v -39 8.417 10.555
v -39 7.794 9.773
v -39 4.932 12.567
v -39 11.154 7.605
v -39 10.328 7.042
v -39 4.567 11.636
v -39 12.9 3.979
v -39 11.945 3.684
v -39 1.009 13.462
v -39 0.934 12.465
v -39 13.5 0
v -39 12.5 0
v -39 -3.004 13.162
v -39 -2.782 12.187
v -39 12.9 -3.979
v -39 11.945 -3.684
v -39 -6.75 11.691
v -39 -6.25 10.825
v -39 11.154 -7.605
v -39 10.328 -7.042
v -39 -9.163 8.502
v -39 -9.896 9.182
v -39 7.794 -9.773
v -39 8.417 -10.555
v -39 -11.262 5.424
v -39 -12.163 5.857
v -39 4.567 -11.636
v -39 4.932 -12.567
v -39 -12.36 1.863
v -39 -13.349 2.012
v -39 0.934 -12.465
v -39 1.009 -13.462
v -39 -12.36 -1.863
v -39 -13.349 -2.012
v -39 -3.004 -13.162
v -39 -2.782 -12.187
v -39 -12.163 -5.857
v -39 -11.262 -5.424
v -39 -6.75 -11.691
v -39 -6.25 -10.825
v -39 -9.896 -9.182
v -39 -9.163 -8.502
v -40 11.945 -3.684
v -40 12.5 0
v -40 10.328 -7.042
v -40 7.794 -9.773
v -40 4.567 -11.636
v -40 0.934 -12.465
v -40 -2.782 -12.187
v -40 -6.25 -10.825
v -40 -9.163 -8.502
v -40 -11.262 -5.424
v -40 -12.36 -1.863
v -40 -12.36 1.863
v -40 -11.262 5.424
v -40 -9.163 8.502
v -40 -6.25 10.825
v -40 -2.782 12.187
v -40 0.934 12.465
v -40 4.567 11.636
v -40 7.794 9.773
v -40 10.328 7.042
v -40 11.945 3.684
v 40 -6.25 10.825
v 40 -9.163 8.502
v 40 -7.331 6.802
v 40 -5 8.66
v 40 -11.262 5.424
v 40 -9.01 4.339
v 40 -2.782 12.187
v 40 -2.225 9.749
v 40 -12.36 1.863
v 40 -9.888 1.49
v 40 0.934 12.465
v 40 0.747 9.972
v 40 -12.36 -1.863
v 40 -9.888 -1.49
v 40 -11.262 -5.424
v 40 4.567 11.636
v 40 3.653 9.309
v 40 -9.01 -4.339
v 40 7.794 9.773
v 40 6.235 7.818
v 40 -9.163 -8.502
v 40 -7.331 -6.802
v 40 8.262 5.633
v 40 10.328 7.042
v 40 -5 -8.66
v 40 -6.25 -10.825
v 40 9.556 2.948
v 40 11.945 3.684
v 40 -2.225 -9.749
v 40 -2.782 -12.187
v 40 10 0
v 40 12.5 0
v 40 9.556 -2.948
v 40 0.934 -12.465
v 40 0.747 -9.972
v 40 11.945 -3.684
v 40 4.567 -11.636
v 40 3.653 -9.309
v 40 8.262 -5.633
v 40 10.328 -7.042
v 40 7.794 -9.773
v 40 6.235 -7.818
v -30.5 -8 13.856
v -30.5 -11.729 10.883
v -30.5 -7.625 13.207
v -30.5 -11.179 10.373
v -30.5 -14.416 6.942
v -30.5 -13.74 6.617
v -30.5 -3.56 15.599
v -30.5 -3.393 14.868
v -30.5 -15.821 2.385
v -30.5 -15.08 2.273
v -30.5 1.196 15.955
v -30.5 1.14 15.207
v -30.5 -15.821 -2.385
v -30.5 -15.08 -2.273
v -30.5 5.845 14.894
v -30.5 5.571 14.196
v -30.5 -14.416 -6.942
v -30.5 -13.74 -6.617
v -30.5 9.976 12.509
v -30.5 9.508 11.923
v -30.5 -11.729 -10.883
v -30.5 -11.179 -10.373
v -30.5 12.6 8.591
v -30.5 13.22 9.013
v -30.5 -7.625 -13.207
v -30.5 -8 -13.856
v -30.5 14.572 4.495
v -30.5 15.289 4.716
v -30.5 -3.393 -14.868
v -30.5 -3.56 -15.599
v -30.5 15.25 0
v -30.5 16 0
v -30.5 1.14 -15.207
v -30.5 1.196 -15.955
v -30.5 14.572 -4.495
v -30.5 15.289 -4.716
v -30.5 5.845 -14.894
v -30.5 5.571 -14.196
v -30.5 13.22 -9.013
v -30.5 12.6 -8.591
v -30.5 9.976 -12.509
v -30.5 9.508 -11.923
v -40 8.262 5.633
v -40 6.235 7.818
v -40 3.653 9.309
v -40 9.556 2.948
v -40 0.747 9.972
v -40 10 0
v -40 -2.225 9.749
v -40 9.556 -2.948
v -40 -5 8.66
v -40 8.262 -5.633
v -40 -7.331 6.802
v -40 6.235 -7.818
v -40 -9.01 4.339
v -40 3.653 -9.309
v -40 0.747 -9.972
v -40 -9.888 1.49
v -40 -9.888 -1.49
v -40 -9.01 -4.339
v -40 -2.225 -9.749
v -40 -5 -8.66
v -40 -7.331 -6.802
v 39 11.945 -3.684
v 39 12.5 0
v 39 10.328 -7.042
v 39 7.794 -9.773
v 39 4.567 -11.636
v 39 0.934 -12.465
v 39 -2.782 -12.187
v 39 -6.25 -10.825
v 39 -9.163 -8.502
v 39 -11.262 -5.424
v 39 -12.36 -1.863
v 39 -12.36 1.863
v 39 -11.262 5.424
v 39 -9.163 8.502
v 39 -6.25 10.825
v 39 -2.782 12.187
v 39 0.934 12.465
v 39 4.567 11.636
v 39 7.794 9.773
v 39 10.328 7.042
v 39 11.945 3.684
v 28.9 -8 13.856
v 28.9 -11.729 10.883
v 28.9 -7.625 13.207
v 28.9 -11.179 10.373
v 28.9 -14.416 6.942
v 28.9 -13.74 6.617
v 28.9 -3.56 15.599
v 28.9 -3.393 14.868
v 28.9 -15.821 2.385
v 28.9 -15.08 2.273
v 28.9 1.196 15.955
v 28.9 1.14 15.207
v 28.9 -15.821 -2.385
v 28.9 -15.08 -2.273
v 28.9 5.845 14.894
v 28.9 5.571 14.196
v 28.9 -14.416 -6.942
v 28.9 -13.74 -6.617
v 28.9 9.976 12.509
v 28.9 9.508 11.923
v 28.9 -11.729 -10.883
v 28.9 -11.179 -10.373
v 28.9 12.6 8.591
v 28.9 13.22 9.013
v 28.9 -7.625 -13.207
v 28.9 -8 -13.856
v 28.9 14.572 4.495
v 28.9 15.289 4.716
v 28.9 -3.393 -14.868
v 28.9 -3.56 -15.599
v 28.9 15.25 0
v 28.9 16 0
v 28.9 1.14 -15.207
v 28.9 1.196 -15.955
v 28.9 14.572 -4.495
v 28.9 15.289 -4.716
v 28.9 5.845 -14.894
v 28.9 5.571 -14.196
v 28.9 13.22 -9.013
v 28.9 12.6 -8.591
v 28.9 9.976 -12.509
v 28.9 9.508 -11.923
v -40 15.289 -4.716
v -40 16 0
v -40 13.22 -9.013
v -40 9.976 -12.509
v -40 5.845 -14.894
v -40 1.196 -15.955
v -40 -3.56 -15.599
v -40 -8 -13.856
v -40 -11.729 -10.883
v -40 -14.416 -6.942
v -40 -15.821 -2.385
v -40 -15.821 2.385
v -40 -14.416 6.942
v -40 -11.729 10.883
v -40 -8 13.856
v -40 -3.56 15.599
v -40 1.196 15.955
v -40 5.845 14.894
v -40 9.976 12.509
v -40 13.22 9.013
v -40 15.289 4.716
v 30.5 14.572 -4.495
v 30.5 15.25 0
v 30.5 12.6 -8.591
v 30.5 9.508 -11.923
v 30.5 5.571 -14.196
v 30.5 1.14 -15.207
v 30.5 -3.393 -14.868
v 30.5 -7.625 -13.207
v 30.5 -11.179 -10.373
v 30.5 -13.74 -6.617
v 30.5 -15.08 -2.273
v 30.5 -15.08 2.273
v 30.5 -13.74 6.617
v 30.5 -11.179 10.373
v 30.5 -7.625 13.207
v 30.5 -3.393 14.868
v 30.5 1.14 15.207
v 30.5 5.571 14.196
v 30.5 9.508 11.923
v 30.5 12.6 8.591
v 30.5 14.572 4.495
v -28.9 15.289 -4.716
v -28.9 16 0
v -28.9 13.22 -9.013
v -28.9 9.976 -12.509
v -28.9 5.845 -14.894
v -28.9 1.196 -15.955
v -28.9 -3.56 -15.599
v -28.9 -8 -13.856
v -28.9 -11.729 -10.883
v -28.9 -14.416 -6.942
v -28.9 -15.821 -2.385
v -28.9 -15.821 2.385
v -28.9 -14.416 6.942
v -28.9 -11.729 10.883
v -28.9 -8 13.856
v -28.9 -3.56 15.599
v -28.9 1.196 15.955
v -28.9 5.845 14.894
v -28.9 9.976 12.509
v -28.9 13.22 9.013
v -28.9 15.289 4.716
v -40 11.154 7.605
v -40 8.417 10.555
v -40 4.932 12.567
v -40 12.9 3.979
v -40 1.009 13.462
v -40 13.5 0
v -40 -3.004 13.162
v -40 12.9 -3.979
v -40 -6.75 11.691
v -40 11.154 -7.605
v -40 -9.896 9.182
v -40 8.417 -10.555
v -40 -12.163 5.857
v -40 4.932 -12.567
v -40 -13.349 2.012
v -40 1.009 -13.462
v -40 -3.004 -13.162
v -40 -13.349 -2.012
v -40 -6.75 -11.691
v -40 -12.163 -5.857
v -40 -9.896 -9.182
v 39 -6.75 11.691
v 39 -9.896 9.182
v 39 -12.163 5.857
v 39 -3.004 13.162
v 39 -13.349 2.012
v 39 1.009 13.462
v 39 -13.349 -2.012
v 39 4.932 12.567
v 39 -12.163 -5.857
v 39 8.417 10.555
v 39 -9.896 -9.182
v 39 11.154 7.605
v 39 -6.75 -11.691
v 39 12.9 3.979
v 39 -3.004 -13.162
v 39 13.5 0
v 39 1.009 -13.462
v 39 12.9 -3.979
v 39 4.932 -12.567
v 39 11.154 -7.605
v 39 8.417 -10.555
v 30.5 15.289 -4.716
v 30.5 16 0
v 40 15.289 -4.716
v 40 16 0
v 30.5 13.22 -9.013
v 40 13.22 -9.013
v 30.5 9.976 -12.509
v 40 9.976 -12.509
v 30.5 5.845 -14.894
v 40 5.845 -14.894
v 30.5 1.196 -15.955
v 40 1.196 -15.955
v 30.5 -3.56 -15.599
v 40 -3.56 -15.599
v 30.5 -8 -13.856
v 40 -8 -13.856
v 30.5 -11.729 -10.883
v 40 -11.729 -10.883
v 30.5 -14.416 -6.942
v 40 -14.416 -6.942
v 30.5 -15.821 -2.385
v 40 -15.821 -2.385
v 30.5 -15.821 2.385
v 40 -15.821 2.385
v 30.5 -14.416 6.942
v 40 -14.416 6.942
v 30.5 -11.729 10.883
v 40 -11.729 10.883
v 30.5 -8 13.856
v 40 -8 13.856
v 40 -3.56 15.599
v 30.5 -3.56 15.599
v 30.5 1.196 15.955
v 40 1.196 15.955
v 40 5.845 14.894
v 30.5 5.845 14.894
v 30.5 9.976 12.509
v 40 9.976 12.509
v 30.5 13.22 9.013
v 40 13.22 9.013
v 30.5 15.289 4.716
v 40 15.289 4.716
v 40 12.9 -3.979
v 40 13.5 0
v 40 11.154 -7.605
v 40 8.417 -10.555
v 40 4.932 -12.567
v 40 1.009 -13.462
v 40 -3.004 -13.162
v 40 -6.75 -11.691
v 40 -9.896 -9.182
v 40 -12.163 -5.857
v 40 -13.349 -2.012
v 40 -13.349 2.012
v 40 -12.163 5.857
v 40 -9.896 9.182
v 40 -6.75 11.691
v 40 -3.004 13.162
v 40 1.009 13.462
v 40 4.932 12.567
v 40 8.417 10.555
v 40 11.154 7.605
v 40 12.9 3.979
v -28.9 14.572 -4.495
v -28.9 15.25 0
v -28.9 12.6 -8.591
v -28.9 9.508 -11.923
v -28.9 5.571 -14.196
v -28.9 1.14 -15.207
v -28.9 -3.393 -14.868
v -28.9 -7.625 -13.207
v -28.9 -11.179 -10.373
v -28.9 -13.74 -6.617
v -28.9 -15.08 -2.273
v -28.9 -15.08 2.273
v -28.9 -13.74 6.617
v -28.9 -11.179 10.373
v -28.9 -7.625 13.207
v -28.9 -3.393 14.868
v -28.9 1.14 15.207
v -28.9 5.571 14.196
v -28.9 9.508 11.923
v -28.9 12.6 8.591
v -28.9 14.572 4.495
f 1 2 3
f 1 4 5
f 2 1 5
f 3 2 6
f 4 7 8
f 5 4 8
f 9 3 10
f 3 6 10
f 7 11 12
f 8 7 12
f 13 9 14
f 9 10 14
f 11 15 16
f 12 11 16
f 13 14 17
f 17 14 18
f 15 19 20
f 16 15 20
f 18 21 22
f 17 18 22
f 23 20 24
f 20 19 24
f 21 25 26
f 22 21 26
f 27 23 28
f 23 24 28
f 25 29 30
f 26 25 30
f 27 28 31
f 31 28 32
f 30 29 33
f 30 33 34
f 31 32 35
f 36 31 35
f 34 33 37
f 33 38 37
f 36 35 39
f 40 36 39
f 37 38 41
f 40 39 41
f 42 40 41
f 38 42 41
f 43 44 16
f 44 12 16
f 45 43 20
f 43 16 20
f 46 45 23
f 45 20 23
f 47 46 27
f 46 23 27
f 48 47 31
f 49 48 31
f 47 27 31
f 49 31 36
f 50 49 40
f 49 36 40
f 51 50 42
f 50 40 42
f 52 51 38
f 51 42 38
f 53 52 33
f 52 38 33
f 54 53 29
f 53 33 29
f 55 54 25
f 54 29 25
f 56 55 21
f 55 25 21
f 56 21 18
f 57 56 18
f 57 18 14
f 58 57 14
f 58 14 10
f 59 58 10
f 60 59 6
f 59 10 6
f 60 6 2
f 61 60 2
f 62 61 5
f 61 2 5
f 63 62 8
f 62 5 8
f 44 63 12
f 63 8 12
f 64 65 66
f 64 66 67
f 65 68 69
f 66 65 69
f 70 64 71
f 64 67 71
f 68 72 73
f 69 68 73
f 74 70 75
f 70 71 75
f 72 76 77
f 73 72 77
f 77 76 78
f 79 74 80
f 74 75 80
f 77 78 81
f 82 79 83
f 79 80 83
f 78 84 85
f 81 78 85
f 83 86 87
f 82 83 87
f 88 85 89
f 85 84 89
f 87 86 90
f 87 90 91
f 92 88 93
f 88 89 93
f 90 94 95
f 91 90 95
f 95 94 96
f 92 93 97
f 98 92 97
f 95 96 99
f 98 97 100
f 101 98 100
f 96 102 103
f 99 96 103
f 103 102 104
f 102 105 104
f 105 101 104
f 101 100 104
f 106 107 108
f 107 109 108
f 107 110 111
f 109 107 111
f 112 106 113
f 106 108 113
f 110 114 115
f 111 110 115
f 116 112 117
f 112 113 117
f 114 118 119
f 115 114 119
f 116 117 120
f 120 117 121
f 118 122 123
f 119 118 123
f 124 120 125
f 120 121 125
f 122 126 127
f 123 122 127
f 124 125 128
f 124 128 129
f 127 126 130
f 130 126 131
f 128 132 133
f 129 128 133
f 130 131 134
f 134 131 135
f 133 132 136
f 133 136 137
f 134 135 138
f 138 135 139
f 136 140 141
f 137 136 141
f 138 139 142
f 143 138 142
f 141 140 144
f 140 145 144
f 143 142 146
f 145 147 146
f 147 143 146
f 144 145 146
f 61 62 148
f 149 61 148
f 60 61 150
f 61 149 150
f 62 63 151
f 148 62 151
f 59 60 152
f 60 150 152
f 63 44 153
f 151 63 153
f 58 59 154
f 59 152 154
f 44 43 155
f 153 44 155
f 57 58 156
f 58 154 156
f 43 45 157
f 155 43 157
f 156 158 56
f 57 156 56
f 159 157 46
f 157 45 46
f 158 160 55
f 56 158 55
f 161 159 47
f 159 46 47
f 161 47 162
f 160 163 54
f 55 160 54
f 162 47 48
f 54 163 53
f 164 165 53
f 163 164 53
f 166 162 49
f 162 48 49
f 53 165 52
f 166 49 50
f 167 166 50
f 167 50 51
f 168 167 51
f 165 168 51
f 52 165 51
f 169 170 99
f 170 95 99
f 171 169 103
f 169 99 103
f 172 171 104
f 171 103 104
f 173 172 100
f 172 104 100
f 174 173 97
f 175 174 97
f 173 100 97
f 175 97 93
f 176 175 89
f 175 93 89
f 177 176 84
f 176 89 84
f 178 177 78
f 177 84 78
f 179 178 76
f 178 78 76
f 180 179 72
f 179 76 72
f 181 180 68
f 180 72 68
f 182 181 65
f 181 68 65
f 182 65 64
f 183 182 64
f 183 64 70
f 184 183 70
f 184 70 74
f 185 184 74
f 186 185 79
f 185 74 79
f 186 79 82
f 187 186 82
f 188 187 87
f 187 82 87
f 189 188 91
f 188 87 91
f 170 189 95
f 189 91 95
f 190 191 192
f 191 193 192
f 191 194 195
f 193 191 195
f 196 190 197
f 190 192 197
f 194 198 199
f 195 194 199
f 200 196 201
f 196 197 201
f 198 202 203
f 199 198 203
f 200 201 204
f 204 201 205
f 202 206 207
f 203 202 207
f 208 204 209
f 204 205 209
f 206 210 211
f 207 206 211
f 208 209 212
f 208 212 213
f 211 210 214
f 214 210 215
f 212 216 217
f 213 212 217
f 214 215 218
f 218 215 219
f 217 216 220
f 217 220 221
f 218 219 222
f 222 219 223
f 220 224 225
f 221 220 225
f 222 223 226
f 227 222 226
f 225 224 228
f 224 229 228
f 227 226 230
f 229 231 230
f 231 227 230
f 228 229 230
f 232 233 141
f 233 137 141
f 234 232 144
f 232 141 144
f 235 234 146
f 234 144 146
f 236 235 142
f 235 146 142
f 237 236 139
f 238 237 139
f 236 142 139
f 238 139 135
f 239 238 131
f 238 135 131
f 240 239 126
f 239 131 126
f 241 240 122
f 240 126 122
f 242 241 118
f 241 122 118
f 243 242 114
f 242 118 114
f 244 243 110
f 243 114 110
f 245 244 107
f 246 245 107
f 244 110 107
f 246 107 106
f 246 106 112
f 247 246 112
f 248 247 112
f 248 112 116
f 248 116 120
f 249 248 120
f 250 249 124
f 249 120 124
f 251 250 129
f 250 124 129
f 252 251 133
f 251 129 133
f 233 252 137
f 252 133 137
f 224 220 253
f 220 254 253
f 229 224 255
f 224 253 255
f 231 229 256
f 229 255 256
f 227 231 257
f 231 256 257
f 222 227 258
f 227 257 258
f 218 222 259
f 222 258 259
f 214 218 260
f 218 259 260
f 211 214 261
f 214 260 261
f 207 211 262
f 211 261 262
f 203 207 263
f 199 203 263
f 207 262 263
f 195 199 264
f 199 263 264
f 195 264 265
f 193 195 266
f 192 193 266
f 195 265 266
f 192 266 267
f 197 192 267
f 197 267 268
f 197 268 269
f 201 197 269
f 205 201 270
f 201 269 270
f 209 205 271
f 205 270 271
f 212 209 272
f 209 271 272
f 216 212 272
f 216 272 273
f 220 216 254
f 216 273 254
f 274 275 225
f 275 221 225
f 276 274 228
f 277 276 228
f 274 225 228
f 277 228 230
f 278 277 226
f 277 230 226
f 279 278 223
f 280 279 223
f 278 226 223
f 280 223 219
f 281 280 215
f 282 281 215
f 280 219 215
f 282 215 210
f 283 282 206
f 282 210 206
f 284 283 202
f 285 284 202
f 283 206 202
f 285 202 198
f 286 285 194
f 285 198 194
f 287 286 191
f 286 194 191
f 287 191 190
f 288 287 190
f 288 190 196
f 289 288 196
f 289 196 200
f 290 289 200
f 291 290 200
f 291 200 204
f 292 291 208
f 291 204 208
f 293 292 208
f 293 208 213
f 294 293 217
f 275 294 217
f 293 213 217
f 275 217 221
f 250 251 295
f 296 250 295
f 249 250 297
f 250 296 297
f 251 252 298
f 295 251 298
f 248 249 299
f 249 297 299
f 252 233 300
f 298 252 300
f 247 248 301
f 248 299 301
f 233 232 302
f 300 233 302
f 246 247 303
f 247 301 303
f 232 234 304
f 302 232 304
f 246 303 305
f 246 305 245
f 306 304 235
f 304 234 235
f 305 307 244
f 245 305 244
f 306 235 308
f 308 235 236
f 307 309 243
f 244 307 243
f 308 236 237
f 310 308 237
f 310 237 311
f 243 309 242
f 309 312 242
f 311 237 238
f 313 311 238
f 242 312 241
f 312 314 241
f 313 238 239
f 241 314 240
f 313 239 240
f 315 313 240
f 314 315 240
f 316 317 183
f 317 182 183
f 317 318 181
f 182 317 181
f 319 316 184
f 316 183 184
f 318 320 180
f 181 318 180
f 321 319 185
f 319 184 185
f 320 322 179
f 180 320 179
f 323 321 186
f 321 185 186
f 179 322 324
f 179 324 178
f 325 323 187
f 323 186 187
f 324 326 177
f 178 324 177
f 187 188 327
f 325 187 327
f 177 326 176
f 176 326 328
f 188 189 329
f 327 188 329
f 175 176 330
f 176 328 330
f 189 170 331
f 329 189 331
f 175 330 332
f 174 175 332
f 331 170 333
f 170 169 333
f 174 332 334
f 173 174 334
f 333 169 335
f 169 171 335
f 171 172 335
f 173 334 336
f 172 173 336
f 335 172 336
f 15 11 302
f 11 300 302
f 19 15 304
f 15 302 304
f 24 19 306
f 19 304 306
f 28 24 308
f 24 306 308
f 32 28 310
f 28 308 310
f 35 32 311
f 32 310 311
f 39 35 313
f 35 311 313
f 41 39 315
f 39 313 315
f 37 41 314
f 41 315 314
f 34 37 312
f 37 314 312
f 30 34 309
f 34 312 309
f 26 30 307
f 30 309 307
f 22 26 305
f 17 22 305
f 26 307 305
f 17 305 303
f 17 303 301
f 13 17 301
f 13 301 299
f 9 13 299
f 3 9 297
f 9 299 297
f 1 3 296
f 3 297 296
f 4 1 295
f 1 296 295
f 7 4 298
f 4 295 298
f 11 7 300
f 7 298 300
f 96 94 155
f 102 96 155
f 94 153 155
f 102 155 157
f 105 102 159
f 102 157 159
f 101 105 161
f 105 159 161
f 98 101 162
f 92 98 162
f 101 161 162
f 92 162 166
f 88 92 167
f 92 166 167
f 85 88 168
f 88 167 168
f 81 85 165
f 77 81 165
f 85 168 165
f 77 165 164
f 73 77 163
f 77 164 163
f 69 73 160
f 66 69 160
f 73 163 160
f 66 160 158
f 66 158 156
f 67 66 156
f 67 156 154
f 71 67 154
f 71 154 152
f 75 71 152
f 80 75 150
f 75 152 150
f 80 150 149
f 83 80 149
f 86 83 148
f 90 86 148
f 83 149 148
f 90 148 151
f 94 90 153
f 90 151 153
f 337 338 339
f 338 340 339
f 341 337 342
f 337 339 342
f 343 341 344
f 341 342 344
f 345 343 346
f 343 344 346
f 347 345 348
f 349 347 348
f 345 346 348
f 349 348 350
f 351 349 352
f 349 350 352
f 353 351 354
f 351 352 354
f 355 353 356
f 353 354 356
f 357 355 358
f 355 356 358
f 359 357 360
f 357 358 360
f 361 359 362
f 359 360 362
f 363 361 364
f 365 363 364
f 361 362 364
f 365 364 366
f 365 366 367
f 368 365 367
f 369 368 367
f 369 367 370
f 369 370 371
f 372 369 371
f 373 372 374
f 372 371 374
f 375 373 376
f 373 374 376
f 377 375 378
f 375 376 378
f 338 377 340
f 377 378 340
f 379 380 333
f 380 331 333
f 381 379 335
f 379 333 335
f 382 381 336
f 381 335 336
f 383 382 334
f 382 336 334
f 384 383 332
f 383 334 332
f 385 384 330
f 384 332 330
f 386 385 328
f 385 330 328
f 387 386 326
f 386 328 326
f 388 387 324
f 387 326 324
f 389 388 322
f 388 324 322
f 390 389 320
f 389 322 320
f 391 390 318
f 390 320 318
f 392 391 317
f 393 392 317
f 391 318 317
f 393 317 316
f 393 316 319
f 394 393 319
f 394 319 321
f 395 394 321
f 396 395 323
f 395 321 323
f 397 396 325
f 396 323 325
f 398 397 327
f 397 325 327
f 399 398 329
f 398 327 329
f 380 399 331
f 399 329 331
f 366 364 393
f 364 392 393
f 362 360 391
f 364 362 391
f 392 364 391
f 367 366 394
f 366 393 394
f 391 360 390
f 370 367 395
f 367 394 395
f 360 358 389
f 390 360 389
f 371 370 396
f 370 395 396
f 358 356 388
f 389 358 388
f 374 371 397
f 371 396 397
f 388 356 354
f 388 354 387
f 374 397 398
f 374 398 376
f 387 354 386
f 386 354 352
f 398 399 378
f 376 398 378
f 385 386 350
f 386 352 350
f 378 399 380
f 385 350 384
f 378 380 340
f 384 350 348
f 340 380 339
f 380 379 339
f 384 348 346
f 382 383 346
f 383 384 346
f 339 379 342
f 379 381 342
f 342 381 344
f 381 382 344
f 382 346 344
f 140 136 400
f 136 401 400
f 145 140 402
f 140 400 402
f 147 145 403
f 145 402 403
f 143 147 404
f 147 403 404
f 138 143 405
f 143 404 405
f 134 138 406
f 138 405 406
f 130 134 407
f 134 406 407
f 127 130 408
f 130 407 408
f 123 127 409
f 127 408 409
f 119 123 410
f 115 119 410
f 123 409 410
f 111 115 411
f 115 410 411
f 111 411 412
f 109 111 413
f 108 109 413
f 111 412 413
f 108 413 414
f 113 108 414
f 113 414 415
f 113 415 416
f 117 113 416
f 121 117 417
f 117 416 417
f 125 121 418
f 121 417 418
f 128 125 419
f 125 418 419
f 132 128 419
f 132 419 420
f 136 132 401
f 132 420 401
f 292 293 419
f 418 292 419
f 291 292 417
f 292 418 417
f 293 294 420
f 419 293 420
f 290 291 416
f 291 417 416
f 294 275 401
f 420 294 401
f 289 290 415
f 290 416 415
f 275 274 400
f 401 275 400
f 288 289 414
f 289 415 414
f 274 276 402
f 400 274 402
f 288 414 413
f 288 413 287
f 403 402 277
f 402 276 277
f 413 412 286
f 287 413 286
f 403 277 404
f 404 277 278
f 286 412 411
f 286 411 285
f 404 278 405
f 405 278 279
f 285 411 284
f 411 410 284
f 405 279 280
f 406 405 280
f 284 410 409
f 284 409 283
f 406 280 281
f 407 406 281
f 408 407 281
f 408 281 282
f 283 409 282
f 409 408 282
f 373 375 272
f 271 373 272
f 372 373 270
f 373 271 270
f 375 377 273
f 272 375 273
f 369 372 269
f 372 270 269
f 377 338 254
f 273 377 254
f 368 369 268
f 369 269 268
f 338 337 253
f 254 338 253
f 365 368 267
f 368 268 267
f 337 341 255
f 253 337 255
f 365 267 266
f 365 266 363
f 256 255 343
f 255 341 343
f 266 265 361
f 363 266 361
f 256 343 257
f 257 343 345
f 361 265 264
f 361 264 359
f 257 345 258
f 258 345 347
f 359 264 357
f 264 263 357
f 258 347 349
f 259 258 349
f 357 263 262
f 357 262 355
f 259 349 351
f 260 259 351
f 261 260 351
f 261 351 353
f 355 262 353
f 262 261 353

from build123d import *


with BuildPart() as part:
    # Esboço1 → Revolução1 (revolve)
    with BuildSketch(Plane.XY):
        Polygon((-40, 16), (-30.5, 16), (-30.5, 15.25), (-28.9, 15.25), (-28.9, 16), (28.9, 16), (28.9, 15.25), (30.5, 15.25), (30.5, 16), (40, 16), (40, 13.5), (39, 13.5), (39, 12.5), (40, 12.5), (40, 10), (-40, 10), (-40, 12.5), (-39, 12.5), (-39, 13.5), (-40, 13.5), align=None)
    revolve(axis=Axis((0, 0, 0), (-1, 0, 0)))


solid = part.part
